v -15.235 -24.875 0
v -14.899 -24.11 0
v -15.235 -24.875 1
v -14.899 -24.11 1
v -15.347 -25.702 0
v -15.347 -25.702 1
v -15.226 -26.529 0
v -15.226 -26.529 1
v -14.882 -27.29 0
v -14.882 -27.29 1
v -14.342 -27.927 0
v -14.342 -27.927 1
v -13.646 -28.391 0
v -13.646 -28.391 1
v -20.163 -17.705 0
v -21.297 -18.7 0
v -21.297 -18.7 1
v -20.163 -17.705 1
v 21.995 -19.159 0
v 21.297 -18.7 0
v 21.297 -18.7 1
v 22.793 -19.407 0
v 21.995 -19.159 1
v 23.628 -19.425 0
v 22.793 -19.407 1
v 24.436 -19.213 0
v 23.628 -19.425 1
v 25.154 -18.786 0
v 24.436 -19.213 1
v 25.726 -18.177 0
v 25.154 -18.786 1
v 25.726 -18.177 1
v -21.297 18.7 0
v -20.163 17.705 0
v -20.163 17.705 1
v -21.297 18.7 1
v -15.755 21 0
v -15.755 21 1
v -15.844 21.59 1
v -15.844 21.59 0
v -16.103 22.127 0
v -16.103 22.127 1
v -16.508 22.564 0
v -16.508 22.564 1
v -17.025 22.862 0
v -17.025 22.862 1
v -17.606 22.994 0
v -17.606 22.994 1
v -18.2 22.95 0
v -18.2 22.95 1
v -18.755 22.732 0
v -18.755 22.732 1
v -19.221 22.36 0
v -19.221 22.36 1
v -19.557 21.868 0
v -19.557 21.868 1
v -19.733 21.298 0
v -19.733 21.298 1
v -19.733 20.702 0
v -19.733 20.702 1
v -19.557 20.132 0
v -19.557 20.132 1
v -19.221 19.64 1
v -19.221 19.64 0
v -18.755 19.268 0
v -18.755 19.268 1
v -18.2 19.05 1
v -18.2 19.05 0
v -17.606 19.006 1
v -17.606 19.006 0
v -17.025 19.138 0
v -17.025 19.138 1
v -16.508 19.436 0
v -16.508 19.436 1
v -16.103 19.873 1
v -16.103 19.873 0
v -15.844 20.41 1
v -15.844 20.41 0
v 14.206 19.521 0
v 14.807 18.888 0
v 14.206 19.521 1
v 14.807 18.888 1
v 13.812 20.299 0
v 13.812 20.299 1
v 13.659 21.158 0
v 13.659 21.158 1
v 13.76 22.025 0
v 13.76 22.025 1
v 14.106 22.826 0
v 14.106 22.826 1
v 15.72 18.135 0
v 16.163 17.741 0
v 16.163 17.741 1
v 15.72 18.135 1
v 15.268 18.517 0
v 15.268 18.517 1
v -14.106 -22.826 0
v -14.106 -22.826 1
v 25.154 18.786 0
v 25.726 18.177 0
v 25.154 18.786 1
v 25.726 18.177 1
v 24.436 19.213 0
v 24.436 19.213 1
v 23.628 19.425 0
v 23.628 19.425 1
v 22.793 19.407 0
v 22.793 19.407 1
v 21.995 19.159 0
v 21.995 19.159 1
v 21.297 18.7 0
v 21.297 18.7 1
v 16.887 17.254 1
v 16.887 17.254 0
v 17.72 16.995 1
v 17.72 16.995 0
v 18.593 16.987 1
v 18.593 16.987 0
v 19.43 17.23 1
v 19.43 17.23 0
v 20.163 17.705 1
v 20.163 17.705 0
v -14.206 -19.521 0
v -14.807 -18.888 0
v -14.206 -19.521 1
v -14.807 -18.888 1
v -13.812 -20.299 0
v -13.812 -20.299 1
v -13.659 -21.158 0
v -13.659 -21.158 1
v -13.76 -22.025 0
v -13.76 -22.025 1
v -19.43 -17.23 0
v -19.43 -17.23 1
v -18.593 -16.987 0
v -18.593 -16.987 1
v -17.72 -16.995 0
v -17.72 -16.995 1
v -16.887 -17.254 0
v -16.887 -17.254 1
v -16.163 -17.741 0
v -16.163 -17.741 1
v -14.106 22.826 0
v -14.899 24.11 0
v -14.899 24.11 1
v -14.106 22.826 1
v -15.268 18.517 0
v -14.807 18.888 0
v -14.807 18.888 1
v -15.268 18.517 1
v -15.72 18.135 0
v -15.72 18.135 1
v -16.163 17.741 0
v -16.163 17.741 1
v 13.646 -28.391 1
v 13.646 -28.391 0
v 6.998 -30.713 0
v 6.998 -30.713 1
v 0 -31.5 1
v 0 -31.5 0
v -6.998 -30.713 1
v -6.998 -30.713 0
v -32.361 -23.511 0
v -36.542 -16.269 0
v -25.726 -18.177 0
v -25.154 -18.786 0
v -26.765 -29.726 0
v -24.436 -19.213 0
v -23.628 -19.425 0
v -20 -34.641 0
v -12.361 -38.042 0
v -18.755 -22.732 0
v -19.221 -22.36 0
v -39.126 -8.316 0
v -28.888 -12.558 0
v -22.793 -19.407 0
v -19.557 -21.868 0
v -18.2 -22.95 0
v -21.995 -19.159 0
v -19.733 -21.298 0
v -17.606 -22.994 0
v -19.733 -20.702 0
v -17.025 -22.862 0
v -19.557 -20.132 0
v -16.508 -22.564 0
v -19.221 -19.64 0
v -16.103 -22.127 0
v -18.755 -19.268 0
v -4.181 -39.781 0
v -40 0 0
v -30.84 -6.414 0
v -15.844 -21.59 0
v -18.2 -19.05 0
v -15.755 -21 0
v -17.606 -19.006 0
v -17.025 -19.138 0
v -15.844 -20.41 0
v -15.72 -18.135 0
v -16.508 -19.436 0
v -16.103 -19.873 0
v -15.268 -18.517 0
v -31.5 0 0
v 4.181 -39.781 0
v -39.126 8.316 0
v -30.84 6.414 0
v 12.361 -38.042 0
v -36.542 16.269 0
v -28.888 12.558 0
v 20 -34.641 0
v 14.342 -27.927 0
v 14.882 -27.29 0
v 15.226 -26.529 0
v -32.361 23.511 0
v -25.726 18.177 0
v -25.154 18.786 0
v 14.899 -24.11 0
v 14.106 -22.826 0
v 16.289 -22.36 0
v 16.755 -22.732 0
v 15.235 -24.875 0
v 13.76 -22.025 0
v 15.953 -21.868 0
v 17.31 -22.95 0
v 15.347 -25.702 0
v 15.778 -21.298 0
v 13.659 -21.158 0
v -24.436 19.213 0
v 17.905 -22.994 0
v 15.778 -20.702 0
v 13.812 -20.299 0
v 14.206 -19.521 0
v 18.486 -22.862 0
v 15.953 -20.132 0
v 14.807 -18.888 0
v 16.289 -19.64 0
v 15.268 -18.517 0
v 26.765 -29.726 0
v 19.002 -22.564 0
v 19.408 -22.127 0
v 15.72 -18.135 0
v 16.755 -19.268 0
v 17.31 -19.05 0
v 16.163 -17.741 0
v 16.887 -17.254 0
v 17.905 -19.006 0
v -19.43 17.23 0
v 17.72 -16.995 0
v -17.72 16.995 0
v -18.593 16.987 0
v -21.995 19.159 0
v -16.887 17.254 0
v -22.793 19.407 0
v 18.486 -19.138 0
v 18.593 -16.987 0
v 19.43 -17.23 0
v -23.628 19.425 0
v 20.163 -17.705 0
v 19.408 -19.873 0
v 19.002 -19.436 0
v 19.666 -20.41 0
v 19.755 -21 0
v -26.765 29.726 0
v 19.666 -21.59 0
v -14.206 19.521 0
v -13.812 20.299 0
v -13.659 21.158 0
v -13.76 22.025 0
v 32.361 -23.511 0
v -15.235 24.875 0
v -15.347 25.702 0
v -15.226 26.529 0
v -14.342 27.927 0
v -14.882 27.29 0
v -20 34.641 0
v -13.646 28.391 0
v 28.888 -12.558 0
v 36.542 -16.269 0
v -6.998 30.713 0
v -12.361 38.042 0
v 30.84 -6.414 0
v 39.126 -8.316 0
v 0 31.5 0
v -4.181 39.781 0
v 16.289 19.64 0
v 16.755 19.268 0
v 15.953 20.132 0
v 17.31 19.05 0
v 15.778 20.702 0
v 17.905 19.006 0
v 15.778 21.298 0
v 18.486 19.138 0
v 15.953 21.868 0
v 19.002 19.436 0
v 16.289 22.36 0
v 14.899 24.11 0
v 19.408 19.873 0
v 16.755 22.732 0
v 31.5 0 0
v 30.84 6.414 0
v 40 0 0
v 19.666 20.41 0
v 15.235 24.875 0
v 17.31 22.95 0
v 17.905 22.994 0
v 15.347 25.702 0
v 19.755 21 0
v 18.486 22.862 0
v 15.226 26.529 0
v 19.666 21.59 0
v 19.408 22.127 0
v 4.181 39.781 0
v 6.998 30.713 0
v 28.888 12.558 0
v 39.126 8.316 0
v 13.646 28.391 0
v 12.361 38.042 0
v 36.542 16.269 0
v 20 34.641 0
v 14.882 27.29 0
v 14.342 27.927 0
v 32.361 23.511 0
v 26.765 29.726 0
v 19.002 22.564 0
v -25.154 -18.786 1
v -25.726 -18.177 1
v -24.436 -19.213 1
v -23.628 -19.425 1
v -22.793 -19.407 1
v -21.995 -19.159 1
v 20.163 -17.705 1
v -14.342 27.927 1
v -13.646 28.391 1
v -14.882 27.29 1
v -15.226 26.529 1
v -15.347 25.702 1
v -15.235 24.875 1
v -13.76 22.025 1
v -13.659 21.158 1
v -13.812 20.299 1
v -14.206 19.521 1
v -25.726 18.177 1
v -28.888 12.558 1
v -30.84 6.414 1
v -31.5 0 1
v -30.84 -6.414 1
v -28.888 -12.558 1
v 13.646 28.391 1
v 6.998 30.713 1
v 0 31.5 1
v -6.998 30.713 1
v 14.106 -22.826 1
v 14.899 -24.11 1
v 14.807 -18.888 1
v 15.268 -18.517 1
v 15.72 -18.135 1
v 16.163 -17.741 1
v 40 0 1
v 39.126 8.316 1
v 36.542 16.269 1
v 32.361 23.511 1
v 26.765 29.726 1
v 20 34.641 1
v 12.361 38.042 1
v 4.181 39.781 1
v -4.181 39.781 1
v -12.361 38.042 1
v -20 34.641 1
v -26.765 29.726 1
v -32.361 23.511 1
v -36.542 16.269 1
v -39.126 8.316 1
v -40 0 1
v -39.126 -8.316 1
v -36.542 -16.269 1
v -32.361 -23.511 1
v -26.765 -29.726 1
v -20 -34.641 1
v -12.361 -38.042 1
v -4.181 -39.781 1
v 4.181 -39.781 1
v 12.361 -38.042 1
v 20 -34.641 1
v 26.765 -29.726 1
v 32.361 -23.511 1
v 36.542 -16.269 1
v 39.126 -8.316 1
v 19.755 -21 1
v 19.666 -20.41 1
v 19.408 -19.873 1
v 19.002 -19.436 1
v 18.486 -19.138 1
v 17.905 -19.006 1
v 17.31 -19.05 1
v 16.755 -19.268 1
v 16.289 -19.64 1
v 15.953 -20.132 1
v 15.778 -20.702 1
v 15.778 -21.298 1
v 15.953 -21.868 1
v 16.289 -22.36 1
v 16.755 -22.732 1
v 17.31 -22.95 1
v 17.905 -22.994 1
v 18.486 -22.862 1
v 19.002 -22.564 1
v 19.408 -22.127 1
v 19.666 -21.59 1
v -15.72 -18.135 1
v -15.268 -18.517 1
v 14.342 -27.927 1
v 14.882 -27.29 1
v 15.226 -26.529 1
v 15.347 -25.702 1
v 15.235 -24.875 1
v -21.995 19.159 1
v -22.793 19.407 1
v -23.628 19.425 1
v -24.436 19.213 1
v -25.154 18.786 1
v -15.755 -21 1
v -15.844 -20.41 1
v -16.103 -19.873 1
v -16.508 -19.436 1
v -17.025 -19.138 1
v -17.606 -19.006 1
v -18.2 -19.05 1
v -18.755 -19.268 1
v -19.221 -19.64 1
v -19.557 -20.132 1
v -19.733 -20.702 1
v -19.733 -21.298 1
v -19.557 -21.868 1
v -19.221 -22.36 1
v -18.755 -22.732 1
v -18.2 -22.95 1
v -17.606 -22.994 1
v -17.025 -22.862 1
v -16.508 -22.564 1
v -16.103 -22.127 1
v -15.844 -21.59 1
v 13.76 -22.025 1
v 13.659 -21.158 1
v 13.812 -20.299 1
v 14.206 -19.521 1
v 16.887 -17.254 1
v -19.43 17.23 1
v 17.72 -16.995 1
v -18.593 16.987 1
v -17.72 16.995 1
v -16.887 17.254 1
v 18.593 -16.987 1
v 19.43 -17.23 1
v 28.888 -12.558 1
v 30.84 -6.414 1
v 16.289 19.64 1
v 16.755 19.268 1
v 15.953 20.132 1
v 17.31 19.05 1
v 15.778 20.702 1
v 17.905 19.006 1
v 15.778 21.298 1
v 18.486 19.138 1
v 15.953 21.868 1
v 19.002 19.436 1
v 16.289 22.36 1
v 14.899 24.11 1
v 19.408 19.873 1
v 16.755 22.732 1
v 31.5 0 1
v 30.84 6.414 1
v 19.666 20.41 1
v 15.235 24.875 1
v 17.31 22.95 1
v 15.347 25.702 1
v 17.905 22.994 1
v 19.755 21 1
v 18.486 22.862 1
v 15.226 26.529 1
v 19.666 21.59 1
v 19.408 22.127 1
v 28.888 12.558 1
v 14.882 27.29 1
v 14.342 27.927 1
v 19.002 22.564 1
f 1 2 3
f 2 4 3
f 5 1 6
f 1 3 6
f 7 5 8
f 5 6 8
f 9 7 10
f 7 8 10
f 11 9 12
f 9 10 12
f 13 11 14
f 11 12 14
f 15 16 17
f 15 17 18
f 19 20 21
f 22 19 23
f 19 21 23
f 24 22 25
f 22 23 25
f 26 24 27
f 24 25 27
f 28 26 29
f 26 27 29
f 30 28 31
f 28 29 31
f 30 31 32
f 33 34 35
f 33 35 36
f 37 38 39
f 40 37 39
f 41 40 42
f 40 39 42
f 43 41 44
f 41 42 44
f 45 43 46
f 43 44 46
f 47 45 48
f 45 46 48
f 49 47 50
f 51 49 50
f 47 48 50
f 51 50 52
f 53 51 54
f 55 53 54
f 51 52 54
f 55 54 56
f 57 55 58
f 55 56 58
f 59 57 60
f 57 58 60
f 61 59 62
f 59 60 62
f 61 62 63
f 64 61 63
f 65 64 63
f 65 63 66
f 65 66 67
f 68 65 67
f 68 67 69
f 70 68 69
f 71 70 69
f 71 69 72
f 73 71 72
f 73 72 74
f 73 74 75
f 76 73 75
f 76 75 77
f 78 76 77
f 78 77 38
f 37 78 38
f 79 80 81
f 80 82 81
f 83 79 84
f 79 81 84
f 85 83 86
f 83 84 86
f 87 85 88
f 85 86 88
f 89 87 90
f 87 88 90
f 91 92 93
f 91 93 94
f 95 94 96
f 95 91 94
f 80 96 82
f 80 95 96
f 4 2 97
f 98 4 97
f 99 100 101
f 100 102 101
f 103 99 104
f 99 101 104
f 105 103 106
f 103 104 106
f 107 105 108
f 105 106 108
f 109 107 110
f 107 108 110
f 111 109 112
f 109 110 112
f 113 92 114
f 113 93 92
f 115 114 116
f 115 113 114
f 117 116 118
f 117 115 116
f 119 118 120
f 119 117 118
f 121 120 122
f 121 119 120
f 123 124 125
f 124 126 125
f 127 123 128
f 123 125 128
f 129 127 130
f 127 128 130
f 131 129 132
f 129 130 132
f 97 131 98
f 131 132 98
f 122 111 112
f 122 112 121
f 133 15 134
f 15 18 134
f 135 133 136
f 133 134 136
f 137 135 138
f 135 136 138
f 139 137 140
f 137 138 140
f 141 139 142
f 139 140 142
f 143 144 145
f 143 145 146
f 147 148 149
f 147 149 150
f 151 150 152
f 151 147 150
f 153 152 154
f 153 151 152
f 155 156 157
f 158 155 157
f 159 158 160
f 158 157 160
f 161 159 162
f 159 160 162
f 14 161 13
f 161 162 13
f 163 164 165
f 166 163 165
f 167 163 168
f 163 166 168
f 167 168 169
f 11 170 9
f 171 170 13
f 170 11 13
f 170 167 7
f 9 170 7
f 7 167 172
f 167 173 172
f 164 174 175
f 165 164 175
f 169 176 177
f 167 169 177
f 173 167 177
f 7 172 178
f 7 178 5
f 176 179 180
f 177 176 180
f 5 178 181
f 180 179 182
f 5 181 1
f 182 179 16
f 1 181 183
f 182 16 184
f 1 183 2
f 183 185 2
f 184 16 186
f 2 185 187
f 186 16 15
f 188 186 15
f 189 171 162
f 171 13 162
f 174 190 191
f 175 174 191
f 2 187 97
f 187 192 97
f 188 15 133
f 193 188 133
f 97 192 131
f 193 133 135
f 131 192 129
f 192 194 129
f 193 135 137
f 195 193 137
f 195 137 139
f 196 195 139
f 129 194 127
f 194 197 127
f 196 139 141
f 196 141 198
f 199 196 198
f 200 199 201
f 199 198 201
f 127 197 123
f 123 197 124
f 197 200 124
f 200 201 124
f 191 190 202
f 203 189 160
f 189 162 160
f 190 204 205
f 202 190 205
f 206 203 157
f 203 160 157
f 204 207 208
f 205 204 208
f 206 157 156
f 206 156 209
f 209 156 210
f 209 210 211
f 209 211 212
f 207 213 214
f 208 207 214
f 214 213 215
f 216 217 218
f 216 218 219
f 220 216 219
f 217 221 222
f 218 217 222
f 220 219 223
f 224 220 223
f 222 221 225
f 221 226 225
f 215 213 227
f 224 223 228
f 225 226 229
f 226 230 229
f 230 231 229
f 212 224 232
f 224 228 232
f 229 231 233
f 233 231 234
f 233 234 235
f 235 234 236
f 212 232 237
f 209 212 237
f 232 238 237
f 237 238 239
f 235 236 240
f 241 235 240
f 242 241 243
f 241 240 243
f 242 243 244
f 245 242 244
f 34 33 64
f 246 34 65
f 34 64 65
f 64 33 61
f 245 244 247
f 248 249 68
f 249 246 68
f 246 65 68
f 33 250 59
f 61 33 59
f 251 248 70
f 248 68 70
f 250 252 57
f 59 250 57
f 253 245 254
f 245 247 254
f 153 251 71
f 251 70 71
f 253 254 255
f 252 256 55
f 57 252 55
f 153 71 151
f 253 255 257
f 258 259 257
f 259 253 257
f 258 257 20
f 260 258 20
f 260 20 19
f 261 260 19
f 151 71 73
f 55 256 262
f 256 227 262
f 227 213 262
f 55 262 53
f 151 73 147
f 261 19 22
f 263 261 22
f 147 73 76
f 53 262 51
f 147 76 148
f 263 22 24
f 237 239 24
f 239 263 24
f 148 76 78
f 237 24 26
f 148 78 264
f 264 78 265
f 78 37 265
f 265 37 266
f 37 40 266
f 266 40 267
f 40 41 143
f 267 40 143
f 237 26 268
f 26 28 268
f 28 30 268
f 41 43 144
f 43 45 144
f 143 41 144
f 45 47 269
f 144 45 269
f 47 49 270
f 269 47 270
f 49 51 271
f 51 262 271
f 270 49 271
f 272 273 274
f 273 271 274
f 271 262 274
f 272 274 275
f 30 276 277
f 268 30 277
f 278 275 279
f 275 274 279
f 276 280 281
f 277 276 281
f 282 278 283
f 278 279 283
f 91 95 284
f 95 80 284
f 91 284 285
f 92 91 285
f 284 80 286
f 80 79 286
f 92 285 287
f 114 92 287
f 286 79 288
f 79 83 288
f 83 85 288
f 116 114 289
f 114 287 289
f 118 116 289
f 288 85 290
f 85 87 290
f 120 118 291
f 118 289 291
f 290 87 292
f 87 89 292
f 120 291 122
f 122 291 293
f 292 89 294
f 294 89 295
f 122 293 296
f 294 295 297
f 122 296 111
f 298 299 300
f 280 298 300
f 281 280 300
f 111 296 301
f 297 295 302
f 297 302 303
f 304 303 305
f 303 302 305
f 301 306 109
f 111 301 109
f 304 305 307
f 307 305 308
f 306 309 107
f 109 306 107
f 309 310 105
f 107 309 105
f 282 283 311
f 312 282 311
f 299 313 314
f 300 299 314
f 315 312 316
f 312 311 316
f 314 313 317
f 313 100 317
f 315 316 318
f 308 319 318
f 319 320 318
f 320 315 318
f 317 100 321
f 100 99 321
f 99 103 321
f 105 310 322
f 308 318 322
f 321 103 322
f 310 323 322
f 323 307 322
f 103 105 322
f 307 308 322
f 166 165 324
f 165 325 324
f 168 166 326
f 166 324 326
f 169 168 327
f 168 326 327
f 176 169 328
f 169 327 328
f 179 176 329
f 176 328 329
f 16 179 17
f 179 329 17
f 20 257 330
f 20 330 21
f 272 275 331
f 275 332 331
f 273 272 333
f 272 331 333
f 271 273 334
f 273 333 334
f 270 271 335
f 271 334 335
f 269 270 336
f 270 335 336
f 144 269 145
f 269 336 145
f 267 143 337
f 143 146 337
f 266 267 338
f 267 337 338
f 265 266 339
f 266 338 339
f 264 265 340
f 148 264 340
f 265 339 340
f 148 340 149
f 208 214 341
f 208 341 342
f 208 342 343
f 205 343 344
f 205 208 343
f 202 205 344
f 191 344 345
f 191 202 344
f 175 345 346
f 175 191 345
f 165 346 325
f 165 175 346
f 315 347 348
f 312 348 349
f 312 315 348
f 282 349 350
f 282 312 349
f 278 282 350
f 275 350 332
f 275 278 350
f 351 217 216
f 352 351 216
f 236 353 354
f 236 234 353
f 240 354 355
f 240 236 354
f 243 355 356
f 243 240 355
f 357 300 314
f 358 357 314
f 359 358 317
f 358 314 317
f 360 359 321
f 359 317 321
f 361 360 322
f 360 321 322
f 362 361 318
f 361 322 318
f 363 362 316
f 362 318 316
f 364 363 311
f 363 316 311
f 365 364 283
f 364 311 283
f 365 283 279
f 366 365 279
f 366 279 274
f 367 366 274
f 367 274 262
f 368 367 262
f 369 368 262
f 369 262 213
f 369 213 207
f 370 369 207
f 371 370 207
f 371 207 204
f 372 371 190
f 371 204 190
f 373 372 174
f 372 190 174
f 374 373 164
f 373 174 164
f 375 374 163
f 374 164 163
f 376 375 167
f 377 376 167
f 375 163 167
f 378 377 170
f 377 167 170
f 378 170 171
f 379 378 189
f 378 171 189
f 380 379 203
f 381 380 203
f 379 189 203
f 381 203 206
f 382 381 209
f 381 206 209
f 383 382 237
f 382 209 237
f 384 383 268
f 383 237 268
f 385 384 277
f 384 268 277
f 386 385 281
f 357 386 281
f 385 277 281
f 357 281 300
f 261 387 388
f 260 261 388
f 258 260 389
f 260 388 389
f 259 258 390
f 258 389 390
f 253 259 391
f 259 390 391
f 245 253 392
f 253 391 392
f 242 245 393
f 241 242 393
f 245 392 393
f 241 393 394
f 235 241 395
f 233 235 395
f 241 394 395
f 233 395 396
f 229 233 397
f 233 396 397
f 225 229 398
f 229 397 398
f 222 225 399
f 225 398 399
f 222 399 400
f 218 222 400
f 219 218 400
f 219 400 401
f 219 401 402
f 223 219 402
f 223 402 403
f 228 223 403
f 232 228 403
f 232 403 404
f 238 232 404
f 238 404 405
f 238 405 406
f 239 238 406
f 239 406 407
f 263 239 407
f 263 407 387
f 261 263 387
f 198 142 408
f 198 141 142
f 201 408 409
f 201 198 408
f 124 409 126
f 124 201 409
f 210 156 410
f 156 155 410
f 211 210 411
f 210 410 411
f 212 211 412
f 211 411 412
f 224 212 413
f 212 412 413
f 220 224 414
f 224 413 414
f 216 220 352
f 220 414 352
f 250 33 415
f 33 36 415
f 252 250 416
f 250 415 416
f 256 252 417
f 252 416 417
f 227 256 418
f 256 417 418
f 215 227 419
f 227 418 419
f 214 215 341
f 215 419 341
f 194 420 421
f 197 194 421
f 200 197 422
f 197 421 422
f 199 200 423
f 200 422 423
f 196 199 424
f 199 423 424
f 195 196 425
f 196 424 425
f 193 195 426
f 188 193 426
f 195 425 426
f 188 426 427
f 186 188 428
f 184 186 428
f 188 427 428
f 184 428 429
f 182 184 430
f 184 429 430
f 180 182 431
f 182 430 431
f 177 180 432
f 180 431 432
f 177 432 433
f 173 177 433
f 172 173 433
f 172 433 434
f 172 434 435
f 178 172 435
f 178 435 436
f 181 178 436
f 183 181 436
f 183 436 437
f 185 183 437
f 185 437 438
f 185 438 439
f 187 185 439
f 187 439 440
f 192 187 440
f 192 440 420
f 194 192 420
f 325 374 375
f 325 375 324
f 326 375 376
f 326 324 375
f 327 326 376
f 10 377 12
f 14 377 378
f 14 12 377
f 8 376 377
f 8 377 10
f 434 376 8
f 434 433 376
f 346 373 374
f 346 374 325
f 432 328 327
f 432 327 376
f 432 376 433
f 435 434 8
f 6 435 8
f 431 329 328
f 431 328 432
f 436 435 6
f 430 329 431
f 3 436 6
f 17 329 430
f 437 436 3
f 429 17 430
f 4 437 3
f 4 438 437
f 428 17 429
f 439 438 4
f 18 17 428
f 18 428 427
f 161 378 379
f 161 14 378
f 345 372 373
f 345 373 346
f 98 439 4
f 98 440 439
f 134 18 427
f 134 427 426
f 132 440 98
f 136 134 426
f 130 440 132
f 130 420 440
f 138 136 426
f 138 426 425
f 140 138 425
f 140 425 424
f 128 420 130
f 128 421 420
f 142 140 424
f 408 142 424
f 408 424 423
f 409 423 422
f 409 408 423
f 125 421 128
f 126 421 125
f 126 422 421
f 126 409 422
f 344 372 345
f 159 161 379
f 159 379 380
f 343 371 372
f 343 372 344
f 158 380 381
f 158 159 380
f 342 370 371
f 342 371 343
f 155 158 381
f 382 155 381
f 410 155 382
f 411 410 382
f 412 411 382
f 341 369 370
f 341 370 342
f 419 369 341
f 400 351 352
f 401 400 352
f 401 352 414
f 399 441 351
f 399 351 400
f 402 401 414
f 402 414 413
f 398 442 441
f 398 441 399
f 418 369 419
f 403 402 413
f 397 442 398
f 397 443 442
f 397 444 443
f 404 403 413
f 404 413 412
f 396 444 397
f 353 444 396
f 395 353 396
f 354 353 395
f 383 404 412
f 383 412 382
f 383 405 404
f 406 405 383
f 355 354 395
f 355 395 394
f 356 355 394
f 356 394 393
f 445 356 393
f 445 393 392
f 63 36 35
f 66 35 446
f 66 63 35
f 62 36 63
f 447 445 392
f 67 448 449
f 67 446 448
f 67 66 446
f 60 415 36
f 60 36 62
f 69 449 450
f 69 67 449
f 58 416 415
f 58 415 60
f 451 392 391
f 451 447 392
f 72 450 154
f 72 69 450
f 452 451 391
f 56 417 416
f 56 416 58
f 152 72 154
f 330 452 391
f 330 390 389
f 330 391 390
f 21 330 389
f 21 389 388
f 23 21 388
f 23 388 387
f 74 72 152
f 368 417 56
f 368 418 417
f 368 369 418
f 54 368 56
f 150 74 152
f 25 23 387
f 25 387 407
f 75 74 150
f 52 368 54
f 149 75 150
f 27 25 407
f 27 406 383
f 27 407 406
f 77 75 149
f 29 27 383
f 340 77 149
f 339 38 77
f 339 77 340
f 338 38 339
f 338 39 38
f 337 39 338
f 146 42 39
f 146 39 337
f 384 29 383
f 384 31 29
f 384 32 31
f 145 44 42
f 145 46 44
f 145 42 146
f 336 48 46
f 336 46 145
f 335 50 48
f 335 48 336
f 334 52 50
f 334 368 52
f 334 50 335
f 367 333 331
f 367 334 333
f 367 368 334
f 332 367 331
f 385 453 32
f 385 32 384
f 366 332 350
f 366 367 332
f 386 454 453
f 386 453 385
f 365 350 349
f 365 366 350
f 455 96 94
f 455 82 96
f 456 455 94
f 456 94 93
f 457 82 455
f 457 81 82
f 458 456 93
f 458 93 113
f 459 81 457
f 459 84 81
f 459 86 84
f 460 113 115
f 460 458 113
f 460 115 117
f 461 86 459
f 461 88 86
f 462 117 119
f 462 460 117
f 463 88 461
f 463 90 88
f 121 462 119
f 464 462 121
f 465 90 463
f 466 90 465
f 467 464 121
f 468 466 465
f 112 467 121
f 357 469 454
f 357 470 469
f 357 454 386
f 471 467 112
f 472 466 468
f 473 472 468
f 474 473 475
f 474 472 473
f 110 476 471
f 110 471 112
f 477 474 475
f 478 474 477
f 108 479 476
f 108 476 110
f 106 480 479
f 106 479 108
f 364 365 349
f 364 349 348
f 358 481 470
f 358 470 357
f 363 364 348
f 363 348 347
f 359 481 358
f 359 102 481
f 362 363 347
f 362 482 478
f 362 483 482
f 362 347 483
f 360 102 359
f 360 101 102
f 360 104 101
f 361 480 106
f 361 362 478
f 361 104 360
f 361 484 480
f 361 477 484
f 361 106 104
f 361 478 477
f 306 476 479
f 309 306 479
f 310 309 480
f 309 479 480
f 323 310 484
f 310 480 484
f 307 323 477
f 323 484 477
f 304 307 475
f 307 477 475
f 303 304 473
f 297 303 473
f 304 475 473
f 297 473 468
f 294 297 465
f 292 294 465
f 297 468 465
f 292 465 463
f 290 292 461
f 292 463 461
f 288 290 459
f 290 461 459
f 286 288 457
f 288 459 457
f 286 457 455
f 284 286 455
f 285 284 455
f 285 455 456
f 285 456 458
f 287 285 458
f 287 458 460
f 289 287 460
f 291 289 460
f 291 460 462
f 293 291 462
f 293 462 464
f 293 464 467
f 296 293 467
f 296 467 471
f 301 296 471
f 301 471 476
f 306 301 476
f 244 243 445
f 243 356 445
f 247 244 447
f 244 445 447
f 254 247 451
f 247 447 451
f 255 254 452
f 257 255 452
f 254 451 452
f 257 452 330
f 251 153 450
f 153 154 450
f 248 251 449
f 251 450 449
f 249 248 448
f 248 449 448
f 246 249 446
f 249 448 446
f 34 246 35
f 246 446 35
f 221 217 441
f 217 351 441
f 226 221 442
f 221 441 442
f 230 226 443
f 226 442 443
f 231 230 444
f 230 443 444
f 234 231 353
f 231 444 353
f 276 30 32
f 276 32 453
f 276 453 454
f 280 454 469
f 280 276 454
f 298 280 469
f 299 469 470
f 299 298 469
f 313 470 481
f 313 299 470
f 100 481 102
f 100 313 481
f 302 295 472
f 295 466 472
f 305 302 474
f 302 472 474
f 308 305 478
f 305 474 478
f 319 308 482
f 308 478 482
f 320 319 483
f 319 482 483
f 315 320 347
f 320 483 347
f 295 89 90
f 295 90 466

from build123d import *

# Parameters (mm, degrees)
SKETCH_1_R          = 40
SKETCH_1_R_2        = 24
EXTRUDE_1_DEPTH     = 1
SKETCH_2_R          = 2
CUT_EXTRUDE_1_DEPTH = 10
CUT_EXTRUDE_START   = -10
CUT_EXTRUDE_2_DEPTH = 10
FILLET_1_R          = 3


with BuildPart() as part:
    # 草图1 → 凸台-拉伸1 (new body)
    with BuildSketch(Plane.XY):
        Circle(SKETCH_1_R)
        Circle(SKETCH_1_R_2, mode=Mode.SUBTRACT)
    extrude(amount=EXTRUDE_1_DEPTH)

    # 草图2 → 切除-拉伸1 (cut)
    with BuildSketch(Plane.XY.offset(1)):
        with Locations((17.755280905, -21)):
            Circle(SKETCH_2_R)
        with Locations((17.755280905, 21)):
            Circle(SKETCH_2_R)
        with Locations((-17.755280905, -21)):
            Circle(SKETCH_2_R)
        with Locations((-17.755280905, 21)):
            Circle(SKETCH_2_R)
    extrude(amount=-CUT_EXTRUDE_1_DEPTH, mode=Mode.SUBTRACT)

    # 草图3 → 切除-拉伸2 (cut)
    with BuildSketch(Plane.XY.offset(1).offset(CUT_EXTRUDE_START)):
        with BuildLine():
            Line((12.616369605, -20.416346832), (16.558985107, -26.796455218))
            ThreePointArc((16.558985107, -26.796455218), (0, -31.5), (-16.558985107, -26.796455218))
            Line((-16.558985107, -26.796455218), (-12.616369605, -20.416346832))
            ThreePointArc((-12.616369605, -20.416346832), (0, -24), (12.616369605, -20.416346832))
        make_face()
        with BuildLine():
            Line((18.034256384, -15.835580086), (23.669961504, -20.784198863))
            ThreePointArc((23.669961504, -20.784198863), (31.5, 0), (23.669961504, 20.784198863))
            Line((23.669961504, 20.784198863), (18.034256384, 15.835580086))
            ThreePointArc((18.034256384, 15.835580086), (24, 0), (18.034256384, -15.835580086))
        make_face()
        with BuildLine():
            Line((12.616369605, 20.416346832), (16.558985107, 26.796455218))
            ThreePointArc((16.558985107, 26.796455218), (0, 31.5), (-16.558985107, 26.796455218))
            Line((-16.558985107, 26.796455218), (-12.616369605, 20.416346832))
            ThreePointArc((-12.616369605, 20.416346832), (0, 24), (12.616369605, 20.416346832))
        make_face()
        with BuildLine():
            Line((-18.034256384, 15.835580086), (-23.669961504, 20.784198863))
            ThreePointArc((-23.669961504, 20.784198863), (-31.5, 0), (-23.669961504, -20.784198863))
            Line((-23.669961504, -20.784198863), (-18.034256384, -15.835580086))
            ThreePointArc((-18.034256384, -15.835580086), (-24, 0), (-18.034256384, 15.835580086))
        make_face()
    extrude(amount=CUT_EXTRUDE_2_DEPTH, mode=Mode.SUBTRACT)

    # 圆角1
    fillet_1_edges = [part.edges().sort_by_distance(p)[0] for p in [
        (12.616369605, -20.416346832, 0.5),
        (-12.616369605, -20.416346832, 0.5),
        (18.034256384, 15.835580086, 0.5),
        (18.034256384, -15.835580086, 0.5),
        (12.616369605, 20.416346832, 0.5),
        (-12.616369605, 20.416346832, 0.5),
        (-18.034256384, 15.835580086, 0.5),
        (-18.034256384, -15.835580086, 0.5),
        (-23.669961504, -20.784198863, 0.5),
        (-23.669961504, 20.784198863, 0.5),
        (-16.558985107, 26.796455218, 0.5),
        (16.558985107, 26.796455218, 0.5),
        (23.669961504, 20.784198863, 0.5),
        (23.669961504, -20.784198863, 0.5),
        (16.558985107, -26.796455218, 0.5),
        (-16.558985107, -26.796455218, 0.5),
    ]]
    fillet(fillet_1_edges, radius=FILLET_1_R)


solid = part.part
